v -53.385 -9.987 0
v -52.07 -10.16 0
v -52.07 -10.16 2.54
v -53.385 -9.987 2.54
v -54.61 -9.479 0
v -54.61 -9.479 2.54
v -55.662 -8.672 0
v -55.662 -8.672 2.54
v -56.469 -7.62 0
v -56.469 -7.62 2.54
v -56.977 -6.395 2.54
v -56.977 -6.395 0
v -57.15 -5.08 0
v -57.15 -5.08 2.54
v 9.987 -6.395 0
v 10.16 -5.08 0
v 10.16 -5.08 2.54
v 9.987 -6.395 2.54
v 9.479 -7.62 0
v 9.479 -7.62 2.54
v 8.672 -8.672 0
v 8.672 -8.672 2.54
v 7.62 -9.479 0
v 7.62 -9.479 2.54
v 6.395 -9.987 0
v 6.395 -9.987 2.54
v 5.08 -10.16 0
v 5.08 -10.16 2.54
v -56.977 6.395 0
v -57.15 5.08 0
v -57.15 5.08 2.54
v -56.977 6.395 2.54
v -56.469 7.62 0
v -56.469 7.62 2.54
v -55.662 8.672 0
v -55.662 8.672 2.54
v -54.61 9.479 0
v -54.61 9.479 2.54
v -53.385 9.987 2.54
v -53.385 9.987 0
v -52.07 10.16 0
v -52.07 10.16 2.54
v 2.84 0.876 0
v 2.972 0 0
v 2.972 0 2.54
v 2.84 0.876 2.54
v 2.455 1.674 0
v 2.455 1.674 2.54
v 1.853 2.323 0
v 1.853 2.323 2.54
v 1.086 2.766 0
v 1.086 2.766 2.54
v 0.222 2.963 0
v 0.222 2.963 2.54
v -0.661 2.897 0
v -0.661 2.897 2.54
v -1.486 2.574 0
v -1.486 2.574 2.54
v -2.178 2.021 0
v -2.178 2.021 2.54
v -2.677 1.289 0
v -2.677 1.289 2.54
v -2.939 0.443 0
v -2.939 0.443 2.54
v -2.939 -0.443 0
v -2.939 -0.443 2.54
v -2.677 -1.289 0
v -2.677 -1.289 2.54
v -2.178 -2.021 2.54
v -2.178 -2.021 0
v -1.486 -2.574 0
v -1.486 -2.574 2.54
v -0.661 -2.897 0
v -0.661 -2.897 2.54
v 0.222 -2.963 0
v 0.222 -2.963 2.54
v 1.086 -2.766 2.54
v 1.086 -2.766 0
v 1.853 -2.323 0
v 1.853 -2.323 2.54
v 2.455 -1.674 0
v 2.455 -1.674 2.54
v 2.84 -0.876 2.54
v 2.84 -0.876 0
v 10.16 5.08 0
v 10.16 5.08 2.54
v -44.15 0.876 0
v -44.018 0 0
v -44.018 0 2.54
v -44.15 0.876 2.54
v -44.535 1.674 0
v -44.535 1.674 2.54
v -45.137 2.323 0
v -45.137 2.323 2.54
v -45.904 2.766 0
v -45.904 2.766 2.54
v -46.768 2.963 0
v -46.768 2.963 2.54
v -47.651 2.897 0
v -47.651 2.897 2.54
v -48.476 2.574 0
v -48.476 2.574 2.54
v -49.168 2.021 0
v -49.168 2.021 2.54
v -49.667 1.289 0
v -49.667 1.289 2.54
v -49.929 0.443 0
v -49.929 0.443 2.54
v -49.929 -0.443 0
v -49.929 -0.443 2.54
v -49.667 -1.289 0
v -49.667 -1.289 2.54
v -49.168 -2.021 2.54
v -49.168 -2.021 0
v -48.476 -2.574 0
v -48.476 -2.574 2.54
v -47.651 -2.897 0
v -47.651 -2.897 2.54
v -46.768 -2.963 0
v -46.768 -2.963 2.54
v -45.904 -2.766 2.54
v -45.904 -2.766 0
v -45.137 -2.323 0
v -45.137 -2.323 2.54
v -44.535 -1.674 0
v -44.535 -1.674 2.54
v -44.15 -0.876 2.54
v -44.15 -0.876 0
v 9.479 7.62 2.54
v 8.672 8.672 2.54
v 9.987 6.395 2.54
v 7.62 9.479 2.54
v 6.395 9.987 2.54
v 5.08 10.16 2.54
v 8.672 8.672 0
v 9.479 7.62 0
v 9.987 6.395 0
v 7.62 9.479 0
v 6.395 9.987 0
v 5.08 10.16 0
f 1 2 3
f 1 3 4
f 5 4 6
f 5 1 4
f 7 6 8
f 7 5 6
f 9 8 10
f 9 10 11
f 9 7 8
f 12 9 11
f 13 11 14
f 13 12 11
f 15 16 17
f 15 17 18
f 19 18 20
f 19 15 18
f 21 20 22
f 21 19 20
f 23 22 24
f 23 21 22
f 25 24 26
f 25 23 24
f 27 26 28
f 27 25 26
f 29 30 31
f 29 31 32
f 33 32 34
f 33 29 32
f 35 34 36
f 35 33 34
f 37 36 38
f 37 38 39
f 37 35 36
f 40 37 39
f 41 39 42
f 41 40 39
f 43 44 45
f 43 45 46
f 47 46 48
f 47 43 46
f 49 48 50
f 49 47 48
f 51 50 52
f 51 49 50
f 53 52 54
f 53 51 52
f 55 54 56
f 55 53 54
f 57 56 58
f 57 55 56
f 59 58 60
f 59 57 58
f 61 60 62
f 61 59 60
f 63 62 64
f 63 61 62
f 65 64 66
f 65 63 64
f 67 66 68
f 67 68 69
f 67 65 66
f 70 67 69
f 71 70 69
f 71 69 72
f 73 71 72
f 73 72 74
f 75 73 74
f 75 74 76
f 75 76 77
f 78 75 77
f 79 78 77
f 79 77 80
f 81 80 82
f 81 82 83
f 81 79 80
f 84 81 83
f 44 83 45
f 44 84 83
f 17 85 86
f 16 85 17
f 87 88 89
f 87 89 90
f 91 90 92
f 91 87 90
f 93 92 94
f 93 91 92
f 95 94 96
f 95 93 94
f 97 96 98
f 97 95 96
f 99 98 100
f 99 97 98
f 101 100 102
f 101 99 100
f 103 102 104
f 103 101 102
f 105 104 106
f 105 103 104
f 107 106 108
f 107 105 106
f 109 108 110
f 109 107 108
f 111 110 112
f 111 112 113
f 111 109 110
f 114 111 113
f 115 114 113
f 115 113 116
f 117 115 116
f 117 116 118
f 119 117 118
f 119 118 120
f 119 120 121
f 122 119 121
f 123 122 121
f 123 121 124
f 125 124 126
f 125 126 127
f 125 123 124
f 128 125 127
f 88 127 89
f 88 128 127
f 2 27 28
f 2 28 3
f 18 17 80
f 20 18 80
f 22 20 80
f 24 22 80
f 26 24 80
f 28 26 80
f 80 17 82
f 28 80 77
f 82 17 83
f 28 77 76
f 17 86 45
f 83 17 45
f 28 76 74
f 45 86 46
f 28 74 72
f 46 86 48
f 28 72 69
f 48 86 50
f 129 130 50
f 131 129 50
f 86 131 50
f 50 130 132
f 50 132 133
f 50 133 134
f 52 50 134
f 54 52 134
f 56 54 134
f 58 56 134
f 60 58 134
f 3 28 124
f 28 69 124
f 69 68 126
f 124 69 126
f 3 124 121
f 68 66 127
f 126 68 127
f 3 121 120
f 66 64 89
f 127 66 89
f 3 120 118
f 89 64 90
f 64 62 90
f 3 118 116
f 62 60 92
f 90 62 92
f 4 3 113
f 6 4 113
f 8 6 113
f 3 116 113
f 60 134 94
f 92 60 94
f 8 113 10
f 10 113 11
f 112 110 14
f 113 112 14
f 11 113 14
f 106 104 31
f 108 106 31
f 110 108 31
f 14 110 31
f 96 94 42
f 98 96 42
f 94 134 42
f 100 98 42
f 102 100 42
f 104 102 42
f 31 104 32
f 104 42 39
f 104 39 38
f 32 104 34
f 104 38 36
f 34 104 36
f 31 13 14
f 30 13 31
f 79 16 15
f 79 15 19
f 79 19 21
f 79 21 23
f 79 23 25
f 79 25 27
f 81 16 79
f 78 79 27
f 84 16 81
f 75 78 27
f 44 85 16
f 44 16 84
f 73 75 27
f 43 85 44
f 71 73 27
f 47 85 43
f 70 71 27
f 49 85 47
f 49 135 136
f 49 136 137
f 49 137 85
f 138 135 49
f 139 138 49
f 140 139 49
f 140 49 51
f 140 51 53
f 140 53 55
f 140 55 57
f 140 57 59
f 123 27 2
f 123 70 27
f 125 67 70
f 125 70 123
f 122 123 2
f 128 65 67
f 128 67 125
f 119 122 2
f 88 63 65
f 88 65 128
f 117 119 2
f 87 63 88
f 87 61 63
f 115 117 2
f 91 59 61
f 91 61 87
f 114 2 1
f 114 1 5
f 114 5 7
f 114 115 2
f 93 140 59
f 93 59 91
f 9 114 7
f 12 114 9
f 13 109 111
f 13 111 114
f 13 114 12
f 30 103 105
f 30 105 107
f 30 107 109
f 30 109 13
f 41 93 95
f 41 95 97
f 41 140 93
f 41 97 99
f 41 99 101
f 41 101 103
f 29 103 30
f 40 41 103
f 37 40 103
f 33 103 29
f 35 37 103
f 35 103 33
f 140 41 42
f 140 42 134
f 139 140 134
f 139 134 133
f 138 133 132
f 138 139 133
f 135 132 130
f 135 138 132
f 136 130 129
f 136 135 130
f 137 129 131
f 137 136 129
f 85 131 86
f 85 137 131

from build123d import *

# Parameters (mm, degrees)
SKETCH1_R           = 2.9718
BOSS_EXTRUDE1_DEPTH = 2.54


with BuildPart() as part:
    # Sketch1 → Boss-Extrude1 (new body)
    with BuildSketch(Plane.XY):
        with BuildLine():
            Line((-46.99, 10.16), (0, 10.16))
            Line((0, 10.16), (5.08, 10.16))
            ThreePointArc((5.08, 10.16), (8.672102448, 8.672102448), (10.16, 5.08))
            Line((10.16, 5.08), (10.16, 0))
            Line((10.16, 0), (10.16, -5.08))
            ThreePointArc((10.16, -5.08), (8.672102448, -8.672102448), (5.08, -10.16))
            Line((5.08, -10.16), (-46.99, -10.16))
            Line((-46.99, -10.16), (-52.07, -10.16))
            ThreePointArc((-52.07, -10.16), (-55.662102448, -8.672102448), (-57.15, -5.08))
            Line((-57.15, -5.08), (-57.15, 5.08))
            ThreePointArc((-57.15, 5.08), (-55.662102448, 8.672102448), (-52.07, 10.16))
            Line((-52.07, 10.16), (-46.99, 10.16))
        make_face()
        Circle(SKETCH1_R, mode=Mode.SUBTRACT)
        with Locations((-46.99, 0)):
            Circle(SKETCH1_R, mode=Mode.SUBTRACT)
    extrude(amount=BOSS_EXTRUDE1_DEPTH)


solid = part.part
